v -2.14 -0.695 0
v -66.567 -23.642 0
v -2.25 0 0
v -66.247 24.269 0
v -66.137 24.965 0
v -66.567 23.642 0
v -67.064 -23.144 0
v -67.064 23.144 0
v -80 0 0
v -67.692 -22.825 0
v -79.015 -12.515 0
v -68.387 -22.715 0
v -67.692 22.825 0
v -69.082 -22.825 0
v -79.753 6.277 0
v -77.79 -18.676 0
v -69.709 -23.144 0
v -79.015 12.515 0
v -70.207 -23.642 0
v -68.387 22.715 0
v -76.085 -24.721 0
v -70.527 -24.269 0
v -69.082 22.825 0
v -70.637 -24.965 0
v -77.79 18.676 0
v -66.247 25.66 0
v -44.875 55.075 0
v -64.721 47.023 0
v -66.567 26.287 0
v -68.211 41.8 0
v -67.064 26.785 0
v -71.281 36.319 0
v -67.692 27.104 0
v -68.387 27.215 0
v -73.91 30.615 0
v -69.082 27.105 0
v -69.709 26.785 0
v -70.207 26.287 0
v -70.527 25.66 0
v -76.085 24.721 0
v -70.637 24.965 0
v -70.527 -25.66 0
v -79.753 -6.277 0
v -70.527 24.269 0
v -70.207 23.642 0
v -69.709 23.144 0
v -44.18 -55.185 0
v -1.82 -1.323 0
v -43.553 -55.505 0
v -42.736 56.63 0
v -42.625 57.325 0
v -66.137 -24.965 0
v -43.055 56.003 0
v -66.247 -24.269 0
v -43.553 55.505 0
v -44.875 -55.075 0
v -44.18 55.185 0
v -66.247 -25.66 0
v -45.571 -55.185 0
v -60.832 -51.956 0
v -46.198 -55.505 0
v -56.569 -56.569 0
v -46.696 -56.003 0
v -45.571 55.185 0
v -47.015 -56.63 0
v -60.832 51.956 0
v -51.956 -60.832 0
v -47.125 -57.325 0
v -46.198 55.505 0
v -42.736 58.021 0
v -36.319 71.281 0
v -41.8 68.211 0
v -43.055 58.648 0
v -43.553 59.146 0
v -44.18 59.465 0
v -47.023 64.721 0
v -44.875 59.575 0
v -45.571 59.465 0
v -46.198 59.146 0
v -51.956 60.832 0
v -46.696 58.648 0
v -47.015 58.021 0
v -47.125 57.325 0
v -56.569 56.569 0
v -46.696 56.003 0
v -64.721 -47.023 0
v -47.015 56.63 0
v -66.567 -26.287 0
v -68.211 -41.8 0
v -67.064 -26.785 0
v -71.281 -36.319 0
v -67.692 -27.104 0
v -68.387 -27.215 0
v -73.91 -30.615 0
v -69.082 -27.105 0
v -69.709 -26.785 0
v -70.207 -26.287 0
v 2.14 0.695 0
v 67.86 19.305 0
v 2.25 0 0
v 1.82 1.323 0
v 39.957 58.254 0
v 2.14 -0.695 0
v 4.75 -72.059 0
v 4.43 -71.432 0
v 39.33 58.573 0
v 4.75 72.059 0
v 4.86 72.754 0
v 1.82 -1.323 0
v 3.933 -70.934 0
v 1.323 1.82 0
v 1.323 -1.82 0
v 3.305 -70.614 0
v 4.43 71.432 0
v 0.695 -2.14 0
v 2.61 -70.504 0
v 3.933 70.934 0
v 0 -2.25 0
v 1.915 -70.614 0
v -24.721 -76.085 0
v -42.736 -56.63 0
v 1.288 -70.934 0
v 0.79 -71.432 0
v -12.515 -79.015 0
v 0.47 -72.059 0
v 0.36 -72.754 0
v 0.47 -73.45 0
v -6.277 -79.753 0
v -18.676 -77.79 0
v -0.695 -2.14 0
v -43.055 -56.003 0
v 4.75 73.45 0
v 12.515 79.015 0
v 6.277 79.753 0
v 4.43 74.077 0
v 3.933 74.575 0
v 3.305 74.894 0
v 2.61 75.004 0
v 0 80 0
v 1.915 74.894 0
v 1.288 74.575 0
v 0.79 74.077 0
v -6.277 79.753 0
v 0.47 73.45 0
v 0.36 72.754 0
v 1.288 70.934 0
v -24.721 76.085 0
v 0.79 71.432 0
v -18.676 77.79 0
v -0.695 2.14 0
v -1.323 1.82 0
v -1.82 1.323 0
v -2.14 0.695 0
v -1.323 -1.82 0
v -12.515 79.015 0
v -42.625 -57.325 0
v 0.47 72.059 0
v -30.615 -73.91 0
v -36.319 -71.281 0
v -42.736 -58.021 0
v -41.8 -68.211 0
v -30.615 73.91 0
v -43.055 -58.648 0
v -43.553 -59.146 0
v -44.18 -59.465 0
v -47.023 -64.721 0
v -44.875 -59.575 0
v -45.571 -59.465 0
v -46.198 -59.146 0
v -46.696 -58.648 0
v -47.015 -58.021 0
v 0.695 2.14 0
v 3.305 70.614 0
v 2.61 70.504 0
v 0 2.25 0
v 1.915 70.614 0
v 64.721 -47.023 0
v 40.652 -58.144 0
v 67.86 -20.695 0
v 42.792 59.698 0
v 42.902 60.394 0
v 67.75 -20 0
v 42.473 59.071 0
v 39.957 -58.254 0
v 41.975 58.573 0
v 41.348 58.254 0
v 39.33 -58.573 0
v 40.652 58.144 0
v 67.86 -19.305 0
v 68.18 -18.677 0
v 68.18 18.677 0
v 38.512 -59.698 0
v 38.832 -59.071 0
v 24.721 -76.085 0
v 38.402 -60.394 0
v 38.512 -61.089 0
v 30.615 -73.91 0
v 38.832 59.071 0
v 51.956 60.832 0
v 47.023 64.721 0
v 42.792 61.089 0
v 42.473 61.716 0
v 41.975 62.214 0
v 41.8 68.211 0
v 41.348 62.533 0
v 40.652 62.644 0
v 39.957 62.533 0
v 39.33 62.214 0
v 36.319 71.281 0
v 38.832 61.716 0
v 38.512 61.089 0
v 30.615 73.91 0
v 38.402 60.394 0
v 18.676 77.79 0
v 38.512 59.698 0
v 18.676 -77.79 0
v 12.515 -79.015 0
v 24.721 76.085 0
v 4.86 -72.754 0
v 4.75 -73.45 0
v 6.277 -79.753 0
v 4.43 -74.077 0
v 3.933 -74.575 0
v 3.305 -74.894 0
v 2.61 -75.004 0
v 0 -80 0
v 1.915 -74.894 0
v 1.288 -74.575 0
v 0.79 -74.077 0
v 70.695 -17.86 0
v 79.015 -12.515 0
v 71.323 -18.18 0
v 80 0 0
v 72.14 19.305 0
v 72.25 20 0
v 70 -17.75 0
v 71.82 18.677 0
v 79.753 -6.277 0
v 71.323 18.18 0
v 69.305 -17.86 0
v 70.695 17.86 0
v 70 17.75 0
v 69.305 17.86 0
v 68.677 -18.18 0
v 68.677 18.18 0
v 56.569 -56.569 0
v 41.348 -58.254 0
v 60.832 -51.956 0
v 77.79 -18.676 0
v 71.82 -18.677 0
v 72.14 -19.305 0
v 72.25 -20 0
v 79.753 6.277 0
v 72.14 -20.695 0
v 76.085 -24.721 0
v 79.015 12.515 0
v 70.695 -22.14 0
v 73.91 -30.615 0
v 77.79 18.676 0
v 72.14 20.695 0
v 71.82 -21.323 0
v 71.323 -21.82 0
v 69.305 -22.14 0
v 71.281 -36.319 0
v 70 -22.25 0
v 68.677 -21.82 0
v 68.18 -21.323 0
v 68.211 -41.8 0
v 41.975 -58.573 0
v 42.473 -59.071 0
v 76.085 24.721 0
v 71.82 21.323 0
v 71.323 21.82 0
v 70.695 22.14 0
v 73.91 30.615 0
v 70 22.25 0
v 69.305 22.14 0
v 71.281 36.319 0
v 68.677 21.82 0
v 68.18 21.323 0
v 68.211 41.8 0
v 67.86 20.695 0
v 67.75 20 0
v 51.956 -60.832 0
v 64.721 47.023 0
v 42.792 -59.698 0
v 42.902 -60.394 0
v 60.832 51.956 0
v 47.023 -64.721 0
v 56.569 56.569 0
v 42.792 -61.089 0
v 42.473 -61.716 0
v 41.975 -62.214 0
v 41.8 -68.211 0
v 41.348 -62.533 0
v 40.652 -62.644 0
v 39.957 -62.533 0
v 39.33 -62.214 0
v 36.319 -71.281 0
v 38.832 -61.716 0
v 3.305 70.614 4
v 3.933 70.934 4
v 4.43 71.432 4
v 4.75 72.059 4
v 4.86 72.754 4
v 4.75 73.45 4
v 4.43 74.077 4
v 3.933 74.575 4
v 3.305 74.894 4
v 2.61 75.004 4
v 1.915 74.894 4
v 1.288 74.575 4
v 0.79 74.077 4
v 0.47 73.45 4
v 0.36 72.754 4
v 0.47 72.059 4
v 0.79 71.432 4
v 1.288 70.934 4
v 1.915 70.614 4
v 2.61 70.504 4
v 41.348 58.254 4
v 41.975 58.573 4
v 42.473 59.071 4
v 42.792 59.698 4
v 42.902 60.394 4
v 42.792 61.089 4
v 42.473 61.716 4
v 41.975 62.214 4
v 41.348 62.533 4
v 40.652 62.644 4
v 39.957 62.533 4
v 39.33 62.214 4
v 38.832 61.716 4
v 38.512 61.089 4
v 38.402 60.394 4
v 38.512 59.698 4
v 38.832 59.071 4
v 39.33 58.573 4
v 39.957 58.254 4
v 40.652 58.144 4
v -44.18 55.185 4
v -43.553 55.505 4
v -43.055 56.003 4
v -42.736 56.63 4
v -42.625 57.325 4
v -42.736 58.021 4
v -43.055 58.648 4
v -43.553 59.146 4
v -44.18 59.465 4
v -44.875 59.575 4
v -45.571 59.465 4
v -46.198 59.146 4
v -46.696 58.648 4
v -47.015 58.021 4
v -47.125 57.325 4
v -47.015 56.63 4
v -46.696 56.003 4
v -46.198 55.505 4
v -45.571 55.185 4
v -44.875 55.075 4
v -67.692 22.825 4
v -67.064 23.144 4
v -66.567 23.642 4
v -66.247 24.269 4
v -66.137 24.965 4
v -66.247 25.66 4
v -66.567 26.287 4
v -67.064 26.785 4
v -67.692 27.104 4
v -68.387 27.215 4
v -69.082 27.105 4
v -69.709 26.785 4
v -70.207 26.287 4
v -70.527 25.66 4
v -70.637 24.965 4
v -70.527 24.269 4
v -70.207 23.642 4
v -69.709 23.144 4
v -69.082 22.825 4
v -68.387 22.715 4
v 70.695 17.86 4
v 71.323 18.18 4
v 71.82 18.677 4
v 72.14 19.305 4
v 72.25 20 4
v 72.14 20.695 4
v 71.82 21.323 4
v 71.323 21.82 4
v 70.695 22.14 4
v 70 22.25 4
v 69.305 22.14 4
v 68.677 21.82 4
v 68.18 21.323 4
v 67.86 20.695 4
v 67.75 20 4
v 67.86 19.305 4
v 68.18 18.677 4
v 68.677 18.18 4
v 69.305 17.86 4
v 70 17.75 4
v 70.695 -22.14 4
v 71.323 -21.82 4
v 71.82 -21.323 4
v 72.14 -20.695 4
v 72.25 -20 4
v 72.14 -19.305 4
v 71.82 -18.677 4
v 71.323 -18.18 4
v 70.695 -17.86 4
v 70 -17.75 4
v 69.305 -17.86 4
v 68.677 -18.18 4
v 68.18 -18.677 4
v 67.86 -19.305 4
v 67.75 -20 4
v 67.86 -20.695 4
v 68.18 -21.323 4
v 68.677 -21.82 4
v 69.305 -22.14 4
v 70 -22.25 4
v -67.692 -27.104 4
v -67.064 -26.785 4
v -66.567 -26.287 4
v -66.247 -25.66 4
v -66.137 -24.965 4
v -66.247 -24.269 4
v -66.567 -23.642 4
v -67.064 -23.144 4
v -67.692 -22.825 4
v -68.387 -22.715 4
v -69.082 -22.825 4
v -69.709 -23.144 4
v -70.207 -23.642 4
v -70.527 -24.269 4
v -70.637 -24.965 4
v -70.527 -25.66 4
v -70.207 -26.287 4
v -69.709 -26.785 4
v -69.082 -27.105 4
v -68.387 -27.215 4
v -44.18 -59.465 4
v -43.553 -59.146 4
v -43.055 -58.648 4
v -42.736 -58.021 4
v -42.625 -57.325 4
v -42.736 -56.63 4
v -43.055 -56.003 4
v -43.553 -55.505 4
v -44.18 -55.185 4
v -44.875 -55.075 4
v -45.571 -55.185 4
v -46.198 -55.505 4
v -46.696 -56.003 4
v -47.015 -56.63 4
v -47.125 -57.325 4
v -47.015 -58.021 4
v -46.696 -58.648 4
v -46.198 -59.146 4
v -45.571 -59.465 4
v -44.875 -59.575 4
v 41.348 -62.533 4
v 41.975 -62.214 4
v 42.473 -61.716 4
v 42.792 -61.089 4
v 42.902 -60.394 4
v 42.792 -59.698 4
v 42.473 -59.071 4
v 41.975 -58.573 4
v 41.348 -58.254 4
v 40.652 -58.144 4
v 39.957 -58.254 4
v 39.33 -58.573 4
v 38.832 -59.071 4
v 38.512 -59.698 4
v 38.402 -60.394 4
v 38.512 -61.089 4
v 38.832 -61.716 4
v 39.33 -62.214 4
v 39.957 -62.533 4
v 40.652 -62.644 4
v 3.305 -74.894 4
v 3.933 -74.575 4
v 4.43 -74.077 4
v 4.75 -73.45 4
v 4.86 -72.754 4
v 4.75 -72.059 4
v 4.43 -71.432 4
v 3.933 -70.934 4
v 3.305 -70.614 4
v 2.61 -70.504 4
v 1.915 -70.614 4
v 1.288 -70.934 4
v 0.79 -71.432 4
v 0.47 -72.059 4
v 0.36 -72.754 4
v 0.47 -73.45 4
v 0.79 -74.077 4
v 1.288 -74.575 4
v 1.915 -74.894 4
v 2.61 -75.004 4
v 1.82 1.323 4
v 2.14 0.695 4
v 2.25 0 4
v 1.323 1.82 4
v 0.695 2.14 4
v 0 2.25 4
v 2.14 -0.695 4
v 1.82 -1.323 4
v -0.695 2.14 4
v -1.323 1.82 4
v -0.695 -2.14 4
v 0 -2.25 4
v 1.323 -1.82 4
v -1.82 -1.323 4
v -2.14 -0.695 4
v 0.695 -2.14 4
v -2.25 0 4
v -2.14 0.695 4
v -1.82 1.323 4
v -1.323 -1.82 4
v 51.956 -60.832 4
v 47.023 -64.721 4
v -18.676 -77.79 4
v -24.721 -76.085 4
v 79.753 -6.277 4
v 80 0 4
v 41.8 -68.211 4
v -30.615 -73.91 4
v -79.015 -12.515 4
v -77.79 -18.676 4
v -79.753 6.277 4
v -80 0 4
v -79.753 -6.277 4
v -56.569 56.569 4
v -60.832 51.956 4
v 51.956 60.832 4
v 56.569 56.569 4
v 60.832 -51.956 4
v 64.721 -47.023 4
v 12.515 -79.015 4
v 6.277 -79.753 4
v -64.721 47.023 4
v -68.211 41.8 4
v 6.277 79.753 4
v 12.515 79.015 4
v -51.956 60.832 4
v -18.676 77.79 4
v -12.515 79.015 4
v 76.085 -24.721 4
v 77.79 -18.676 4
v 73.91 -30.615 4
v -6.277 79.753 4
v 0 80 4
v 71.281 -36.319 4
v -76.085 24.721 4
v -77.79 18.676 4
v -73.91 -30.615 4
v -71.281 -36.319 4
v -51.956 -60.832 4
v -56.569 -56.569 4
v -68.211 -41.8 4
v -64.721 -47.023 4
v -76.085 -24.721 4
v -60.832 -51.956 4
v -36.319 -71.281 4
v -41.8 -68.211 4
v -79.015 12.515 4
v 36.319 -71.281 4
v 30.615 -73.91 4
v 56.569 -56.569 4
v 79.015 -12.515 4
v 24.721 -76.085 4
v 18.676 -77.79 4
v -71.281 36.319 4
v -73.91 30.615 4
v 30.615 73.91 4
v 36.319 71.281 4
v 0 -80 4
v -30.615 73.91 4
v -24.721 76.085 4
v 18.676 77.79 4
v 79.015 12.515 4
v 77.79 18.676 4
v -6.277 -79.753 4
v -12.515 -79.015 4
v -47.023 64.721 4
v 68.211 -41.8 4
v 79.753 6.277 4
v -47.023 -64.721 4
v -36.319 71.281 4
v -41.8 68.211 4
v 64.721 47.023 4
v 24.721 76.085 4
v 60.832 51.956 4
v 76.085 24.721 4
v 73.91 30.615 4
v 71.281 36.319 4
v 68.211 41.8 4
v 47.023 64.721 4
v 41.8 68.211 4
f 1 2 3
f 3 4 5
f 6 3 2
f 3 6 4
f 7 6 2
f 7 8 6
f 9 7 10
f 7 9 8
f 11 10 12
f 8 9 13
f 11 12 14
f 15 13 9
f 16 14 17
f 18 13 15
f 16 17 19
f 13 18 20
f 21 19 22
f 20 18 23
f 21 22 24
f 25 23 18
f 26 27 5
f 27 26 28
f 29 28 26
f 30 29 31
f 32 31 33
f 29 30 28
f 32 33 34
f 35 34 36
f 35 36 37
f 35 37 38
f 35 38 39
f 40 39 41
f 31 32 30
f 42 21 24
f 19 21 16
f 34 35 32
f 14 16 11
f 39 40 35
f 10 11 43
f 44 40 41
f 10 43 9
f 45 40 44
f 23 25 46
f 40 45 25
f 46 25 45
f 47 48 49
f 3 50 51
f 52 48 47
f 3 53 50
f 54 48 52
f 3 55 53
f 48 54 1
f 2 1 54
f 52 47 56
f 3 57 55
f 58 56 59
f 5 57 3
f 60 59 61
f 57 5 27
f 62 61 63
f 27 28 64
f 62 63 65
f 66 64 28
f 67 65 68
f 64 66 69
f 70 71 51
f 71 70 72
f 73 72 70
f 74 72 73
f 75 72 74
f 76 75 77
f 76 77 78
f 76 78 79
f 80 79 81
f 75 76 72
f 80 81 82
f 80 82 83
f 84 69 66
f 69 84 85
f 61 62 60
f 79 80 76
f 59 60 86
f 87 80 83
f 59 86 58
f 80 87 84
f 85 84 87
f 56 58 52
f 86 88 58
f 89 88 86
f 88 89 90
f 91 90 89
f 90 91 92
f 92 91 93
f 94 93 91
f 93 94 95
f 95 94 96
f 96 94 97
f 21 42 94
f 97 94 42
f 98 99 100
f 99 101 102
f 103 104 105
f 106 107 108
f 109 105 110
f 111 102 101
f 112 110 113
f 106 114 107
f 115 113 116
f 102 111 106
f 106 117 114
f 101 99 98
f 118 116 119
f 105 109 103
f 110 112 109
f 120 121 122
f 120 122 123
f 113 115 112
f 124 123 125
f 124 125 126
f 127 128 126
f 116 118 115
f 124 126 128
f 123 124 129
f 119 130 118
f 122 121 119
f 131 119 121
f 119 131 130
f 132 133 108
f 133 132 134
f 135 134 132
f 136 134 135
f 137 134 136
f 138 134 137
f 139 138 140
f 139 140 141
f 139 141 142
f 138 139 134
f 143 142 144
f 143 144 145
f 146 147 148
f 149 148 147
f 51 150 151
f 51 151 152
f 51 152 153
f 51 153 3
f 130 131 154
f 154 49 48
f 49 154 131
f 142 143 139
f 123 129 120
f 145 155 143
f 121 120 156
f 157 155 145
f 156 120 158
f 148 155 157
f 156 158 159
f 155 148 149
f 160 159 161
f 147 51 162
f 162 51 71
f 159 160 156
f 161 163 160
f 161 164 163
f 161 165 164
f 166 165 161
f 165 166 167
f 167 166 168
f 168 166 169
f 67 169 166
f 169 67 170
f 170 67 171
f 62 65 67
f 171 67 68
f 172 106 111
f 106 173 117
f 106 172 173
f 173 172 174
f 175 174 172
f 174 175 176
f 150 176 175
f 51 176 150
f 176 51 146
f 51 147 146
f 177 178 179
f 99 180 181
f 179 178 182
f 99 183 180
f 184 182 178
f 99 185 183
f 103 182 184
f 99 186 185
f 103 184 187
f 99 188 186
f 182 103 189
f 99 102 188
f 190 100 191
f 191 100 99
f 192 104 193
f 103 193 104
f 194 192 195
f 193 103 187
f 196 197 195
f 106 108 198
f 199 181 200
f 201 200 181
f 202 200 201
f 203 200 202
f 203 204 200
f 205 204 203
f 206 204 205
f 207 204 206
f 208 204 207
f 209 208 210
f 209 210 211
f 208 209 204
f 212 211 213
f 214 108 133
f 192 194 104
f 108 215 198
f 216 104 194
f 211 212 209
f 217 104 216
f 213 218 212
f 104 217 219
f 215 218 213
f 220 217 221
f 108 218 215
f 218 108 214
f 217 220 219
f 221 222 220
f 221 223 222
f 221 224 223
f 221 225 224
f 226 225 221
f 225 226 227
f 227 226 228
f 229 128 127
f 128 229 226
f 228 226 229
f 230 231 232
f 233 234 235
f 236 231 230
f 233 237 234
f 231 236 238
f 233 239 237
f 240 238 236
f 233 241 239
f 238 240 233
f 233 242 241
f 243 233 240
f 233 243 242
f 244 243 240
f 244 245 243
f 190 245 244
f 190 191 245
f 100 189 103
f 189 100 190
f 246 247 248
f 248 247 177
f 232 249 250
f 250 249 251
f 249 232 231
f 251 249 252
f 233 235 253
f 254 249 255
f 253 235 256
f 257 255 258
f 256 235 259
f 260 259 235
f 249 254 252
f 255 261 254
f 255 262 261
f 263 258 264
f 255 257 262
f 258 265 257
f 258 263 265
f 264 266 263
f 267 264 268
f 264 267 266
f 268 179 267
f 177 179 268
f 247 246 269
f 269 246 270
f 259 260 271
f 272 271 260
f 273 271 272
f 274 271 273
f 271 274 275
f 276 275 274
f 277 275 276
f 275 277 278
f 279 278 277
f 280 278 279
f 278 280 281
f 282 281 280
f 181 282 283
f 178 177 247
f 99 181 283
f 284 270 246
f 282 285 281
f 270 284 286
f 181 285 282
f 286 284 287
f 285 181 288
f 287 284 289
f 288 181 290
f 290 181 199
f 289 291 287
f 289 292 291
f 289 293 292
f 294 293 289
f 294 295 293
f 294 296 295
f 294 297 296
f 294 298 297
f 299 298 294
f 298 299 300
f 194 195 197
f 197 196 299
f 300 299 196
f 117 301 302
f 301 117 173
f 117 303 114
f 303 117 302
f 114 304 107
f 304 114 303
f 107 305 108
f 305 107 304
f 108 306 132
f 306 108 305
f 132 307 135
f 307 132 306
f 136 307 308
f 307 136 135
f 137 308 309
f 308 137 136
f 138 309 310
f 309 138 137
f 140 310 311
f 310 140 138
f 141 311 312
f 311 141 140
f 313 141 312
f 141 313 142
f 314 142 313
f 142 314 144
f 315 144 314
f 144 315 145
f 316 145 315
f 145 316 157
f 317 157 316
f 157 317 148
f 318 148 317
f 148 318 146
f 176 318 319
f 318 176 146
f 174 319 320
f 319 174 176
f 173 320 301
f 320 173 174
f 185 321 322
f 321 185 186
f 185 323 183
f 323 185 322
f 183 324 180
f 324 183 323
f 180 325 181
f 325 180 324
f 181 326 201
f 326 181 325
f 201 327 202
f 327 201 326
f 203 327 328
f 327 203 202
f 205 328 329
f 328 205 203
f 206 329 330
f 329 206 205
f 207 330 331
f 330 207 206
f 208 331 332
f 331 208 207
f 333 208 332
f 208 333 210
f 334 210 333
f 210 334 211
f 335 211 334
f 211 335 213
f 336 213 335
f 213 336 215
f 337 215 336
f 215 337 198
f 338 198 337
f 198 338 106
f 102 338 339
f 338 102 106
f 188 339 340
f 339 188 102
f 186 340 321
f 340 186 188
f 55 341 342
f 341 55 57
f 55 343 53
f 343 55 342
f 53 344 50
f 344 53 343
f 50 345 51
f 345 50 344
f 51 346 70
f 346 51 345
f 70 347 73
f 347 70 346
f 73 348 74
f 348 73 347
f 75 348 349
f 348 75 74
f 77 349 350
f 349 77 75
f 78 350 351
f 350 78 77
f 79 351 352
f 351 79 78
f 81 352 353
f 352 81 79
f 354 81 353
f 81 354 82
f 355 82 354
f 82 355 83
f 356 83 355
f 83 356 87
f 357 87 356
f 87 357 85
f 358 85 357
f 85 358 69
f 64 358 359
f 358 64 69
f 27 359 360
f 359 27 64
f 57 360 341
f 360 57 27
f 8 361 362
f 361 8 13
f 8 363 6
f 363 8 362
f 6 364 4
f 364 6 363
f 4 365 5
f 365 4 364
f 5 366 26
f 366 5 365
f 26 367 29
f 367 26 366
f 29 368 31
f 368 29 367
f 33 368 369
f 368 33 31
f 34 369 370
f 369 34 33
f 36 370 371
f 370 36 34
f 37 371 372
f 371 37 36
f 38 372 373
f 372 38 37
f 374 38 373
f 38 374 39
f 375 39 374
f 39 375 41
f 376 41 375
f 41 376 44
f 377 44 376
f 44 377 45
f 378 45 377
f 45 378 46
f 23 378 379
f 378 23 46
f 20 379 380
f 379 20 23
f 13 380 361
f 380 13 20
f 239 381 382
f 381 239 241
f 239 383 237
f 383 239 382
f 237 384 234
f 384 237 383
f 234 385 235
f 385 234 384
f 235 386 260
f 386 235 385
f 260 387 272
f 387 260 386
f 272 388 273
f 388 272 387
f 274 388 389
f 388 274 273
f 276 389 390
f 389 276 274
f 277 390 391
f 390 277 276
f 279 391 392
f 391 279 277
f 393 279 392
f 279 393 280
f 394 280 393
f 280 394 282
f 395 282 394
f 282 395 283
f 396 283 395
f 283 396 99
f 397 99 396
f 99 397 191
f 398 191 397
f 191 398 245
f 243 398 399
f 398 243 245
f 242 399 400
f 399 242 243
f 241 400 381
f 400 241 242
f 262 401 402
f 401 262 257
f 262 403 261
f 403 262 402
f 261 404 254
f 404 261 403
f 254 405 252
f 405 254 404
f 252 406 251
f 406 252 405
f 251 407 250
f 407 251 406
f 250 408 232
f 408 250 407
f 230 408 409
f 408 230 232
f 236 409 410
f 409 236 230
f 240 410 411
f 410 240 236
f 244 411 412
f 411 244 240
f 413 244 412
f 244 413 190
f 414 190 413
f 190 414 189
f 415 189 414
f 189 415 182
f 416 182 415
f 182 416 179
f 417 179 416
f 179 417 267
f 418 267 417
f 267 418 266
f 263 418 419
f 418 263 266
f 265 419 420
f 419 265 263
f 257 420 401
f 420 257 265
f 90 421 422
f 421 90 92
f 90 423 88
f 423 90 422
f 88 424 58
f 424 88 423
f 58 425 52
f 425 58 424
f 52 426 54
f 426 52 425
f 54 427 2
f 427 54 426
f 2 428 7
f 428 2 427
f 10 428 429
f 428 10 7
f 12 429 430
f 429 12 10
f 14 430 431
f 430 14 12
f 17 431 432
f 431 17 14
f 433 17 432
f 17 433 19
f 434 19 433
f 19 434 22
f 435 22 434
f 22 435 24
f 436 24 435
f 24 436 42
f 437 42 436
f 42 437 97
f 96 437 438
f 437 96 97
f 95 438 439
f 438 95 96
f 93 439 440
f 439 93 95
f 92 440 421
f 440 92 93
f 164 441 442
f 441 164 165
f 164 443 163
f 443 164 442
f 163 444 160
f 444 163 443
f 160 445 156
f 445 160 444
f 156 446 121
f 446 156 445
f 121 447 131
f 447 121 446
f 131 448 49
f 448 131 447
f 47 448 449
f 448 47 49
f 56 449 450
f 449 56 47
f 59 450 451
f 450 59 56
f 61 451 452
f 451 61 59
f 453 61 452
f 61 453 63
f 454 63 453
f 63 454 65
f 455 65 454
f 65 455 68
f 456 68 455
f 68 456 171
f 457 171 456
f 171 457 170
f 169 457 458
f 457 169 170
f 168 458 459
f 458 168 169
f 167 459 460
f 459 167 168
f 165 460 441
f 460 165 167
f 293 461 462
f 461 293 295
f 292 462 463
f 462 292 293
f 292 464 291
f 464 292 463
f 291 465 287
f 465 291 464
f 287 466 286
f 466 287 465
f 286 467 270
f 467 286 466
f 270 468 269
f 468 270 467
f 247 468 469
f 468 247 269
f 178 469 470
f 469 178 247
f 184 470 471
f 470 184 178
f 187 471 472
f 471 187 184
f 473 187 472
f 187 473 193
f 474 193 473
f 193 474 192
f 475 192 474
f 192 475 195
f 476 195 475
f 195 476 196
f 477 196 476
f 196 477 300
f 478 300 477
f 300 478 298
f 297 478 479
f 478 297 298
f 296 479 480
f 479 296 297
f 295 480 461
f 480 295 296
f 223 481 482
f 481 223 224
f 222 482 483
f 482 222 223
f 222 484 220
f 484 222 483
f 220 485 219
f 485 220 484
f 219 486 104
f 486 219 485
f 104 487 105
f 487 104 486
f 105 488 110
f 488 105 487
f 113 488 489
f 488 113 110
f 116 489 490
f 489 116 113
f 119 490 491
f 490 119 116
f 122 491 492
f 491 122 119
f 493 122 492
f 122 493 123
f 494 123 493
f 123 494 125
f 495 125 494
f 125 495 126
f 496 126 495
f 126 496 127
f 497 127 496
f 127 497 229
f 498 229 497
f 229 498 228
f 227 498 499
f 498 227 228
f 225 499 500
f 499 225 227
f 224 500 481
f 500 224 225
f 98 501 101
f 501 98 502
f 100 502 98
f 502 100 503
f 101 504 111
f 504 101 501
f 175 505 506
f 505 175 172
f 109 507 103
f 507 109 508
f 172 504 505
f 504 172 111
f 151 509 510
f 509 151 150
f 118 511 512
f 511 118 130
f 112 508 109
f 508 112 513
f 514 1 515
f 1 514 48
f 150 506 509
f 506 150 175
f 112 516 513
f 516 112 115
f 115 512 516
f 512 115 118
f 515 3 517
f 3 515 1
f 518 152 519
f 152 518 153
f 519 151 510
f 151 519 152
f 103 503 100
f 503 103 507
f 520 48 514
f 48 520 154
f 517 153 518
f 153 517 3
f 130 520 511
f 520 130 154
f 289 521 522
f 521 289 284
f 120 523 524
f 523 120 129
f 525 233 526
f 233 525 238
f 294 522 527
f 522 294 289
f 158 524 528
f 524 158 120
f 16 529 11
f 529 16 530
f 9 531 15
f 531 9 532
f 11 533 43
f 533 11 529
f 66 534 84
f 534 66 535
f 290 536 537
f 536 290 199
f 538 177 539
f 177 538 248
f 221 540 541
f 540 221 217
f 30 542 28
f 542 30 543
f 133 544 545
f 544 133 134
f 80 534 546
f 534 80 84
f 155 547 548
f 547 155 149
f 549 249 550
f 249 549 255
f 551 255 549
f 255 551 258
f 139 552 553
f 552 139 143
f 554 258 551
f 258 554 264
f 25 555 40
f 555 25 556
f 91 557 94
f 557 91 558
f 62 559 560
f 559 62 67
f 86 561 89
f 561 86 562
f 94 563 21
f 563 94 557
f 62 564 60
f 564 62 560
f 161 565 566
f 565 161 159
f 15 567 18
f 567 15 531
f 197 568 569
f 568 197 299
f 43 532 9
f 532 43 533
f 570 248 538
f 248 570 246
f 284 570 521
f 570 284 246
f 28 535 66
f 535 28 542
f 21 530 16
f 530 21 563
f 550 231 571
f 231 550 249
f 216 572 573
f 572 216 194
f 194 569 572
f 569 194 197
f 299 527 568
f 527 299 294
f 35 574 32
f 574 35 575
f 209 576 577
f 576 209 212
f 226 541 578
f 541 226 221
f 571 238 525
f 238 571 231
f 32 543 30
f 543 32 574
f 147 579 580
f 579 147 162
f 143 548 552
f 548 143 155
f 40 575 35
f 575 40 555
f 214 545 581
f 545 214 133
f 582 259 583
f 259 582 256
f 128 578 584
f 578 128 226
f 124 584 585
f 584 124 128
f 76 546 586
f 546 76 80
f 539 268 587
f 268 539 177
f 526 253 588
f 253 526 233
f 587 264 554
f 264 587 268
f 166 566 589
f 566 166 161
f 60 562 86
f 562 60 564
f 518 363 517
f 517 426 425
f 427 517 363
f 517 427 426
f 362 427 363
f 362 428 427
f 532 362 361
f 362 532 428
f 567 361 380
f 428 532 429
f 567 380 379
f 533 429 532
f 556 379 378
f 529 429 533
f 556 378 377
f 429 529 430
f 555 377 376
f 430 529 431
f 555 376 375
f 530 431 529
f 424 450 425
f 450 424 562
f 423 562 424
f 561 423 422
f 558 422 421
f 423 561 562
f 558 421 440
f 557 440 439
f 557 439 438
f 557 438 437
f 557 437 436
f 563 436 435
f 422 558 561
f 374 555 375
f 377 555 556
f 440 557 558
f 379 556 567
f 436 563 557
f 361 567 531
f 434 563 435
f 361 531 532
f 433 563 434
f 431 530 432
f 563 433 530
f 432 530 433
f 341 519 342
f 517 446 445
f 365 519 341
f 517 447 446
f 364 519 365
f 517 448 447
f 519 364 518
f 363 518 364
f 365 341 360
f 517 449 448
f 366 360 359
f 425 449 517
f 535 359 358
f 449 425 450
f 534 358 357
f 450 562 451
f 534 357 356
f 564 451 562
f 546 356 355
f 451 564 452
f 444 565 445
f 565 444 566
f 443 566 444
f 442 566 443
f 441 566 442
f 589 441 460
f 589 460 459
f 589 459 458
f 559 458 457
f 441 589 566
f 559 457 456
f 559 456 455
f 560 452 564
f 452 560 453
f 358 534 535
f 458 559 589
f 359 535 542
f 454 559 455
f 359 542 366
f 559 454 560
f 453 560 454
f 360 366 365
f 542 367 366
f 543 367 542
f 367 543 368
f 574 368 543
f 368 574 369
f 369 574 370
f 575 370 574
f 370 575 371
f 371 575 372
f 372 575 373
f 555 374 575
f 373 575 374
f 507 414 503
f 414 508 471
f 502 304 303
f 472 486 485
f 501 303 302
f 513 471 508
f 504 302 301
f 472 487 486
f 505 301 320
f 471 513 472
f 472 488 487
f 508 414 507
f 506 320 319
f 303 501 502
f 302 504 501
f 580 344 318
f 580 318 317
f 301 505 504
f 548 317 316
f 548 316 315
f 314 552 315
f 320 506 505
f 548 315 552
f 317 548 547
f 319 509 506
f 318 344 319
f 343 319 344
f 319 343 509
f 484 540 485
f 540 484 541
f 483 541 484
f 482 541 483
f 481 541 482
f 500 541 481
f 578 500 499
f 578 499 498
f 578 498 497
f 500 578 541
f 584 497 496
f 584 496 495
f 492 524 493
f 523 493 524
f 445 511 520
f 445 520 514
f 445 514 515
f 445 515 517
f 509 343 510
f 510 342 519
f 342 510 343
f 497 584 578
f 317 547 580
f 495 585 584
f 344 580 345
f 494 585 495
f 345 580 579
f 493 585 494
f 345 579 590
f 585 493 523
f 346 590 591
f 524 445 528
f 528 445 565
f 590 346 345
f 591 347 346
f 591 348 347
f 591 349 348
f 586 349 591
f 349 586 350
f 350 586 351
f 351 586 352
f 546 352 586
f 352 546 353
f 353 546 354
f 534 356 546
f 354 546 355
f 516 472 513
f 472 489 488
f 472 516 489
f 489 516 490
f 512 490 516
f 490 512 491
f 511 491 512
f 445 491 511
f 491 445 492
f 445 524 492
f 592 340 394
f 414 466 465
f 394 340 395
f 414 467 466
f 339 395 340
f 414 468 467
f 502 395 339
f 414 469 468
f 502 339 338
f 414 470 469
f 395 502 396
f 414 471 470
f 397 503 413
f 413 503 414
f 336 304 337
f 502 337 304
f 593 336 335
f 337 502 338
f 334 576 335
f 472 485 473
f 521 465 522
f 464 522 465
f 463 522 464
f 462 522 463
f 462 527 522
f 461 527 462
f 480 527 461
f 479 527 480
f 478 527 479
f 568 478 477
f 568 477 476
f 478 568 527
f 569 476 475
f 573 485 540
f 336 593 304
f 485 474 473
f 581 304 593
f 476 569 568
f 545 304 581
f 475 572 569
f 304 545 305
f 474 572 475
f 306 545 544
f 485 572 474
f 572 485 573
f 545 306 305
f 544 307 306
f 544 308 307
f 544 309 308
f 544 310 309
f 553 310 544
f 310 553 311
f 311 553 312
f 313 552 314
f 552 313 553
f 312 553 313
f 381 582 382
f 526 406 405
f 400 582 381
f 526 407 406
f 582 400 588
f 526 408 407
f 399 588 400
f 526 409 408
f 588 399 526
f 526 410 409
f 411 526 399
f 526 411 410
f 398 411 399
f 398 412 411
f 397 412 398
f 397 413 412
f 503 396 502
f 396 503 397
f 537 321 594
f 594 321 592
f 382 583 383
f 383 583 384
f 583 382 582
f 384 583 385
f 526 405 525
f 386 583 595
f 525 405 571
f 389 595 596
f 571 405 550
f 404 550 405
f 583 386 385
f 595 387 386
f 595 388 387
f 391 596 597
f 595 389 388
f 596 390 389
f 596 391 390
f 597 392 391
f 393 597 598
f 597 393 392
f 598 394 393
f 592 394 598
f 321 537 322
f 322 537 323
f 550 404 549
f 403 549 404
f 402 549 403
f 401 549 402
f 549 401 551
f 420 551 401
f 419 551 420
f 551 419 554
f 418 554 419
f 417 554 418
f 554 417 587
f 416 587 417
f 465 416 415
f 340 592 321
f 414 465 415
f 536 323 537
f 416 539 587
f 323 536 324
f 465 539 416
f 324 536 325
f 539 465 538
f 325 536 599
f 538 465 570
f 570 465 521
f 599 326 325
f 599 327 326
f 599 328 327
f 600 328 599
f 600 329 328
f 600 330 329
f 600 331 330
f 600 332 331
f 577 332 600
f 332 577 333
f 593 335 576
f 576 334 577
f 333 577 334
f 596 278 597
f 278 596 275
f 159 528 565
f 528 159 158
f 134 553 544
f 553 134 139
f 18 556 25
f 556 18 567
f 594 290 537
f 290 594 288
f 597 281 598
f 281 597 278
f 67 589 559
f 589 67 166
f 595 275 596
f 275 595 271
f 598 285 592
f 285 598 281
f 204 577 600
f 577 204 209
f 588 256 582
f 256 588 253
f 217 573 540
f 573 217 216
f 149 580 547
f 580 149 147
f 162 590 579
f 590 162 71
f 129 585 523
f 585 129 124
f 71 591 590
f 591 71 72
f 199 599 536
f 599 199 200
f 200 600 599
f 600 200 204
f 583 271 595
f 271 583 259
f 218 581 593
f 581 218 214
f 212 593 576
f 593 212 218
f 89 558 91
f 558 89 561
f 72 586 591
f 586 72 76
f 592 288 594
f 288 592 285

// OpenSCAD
module a(){
    circle(r=80,$fn=80);//65/cos(54)
}

module b(){
    for(i=[0:4]){
        rotate([0,0,i*72])
        translate([70,0,0])
        square([70,30],center=true);            
    }
}
module c(){
    for(i=[0:4]){
        rotate([0,0,i*72]){
            translate([70,-20])
            circle(r=2.25,$fn=20);
            translate([70,20])
            circle(r=2.25,$fn=20);
        }
    }
}
difference(){
    linear_extrude(4)a();
    union(){
            
        linear_extrude(5)c();
        cylinder(r=2.25,h=5,$fn=20);
    }
}
